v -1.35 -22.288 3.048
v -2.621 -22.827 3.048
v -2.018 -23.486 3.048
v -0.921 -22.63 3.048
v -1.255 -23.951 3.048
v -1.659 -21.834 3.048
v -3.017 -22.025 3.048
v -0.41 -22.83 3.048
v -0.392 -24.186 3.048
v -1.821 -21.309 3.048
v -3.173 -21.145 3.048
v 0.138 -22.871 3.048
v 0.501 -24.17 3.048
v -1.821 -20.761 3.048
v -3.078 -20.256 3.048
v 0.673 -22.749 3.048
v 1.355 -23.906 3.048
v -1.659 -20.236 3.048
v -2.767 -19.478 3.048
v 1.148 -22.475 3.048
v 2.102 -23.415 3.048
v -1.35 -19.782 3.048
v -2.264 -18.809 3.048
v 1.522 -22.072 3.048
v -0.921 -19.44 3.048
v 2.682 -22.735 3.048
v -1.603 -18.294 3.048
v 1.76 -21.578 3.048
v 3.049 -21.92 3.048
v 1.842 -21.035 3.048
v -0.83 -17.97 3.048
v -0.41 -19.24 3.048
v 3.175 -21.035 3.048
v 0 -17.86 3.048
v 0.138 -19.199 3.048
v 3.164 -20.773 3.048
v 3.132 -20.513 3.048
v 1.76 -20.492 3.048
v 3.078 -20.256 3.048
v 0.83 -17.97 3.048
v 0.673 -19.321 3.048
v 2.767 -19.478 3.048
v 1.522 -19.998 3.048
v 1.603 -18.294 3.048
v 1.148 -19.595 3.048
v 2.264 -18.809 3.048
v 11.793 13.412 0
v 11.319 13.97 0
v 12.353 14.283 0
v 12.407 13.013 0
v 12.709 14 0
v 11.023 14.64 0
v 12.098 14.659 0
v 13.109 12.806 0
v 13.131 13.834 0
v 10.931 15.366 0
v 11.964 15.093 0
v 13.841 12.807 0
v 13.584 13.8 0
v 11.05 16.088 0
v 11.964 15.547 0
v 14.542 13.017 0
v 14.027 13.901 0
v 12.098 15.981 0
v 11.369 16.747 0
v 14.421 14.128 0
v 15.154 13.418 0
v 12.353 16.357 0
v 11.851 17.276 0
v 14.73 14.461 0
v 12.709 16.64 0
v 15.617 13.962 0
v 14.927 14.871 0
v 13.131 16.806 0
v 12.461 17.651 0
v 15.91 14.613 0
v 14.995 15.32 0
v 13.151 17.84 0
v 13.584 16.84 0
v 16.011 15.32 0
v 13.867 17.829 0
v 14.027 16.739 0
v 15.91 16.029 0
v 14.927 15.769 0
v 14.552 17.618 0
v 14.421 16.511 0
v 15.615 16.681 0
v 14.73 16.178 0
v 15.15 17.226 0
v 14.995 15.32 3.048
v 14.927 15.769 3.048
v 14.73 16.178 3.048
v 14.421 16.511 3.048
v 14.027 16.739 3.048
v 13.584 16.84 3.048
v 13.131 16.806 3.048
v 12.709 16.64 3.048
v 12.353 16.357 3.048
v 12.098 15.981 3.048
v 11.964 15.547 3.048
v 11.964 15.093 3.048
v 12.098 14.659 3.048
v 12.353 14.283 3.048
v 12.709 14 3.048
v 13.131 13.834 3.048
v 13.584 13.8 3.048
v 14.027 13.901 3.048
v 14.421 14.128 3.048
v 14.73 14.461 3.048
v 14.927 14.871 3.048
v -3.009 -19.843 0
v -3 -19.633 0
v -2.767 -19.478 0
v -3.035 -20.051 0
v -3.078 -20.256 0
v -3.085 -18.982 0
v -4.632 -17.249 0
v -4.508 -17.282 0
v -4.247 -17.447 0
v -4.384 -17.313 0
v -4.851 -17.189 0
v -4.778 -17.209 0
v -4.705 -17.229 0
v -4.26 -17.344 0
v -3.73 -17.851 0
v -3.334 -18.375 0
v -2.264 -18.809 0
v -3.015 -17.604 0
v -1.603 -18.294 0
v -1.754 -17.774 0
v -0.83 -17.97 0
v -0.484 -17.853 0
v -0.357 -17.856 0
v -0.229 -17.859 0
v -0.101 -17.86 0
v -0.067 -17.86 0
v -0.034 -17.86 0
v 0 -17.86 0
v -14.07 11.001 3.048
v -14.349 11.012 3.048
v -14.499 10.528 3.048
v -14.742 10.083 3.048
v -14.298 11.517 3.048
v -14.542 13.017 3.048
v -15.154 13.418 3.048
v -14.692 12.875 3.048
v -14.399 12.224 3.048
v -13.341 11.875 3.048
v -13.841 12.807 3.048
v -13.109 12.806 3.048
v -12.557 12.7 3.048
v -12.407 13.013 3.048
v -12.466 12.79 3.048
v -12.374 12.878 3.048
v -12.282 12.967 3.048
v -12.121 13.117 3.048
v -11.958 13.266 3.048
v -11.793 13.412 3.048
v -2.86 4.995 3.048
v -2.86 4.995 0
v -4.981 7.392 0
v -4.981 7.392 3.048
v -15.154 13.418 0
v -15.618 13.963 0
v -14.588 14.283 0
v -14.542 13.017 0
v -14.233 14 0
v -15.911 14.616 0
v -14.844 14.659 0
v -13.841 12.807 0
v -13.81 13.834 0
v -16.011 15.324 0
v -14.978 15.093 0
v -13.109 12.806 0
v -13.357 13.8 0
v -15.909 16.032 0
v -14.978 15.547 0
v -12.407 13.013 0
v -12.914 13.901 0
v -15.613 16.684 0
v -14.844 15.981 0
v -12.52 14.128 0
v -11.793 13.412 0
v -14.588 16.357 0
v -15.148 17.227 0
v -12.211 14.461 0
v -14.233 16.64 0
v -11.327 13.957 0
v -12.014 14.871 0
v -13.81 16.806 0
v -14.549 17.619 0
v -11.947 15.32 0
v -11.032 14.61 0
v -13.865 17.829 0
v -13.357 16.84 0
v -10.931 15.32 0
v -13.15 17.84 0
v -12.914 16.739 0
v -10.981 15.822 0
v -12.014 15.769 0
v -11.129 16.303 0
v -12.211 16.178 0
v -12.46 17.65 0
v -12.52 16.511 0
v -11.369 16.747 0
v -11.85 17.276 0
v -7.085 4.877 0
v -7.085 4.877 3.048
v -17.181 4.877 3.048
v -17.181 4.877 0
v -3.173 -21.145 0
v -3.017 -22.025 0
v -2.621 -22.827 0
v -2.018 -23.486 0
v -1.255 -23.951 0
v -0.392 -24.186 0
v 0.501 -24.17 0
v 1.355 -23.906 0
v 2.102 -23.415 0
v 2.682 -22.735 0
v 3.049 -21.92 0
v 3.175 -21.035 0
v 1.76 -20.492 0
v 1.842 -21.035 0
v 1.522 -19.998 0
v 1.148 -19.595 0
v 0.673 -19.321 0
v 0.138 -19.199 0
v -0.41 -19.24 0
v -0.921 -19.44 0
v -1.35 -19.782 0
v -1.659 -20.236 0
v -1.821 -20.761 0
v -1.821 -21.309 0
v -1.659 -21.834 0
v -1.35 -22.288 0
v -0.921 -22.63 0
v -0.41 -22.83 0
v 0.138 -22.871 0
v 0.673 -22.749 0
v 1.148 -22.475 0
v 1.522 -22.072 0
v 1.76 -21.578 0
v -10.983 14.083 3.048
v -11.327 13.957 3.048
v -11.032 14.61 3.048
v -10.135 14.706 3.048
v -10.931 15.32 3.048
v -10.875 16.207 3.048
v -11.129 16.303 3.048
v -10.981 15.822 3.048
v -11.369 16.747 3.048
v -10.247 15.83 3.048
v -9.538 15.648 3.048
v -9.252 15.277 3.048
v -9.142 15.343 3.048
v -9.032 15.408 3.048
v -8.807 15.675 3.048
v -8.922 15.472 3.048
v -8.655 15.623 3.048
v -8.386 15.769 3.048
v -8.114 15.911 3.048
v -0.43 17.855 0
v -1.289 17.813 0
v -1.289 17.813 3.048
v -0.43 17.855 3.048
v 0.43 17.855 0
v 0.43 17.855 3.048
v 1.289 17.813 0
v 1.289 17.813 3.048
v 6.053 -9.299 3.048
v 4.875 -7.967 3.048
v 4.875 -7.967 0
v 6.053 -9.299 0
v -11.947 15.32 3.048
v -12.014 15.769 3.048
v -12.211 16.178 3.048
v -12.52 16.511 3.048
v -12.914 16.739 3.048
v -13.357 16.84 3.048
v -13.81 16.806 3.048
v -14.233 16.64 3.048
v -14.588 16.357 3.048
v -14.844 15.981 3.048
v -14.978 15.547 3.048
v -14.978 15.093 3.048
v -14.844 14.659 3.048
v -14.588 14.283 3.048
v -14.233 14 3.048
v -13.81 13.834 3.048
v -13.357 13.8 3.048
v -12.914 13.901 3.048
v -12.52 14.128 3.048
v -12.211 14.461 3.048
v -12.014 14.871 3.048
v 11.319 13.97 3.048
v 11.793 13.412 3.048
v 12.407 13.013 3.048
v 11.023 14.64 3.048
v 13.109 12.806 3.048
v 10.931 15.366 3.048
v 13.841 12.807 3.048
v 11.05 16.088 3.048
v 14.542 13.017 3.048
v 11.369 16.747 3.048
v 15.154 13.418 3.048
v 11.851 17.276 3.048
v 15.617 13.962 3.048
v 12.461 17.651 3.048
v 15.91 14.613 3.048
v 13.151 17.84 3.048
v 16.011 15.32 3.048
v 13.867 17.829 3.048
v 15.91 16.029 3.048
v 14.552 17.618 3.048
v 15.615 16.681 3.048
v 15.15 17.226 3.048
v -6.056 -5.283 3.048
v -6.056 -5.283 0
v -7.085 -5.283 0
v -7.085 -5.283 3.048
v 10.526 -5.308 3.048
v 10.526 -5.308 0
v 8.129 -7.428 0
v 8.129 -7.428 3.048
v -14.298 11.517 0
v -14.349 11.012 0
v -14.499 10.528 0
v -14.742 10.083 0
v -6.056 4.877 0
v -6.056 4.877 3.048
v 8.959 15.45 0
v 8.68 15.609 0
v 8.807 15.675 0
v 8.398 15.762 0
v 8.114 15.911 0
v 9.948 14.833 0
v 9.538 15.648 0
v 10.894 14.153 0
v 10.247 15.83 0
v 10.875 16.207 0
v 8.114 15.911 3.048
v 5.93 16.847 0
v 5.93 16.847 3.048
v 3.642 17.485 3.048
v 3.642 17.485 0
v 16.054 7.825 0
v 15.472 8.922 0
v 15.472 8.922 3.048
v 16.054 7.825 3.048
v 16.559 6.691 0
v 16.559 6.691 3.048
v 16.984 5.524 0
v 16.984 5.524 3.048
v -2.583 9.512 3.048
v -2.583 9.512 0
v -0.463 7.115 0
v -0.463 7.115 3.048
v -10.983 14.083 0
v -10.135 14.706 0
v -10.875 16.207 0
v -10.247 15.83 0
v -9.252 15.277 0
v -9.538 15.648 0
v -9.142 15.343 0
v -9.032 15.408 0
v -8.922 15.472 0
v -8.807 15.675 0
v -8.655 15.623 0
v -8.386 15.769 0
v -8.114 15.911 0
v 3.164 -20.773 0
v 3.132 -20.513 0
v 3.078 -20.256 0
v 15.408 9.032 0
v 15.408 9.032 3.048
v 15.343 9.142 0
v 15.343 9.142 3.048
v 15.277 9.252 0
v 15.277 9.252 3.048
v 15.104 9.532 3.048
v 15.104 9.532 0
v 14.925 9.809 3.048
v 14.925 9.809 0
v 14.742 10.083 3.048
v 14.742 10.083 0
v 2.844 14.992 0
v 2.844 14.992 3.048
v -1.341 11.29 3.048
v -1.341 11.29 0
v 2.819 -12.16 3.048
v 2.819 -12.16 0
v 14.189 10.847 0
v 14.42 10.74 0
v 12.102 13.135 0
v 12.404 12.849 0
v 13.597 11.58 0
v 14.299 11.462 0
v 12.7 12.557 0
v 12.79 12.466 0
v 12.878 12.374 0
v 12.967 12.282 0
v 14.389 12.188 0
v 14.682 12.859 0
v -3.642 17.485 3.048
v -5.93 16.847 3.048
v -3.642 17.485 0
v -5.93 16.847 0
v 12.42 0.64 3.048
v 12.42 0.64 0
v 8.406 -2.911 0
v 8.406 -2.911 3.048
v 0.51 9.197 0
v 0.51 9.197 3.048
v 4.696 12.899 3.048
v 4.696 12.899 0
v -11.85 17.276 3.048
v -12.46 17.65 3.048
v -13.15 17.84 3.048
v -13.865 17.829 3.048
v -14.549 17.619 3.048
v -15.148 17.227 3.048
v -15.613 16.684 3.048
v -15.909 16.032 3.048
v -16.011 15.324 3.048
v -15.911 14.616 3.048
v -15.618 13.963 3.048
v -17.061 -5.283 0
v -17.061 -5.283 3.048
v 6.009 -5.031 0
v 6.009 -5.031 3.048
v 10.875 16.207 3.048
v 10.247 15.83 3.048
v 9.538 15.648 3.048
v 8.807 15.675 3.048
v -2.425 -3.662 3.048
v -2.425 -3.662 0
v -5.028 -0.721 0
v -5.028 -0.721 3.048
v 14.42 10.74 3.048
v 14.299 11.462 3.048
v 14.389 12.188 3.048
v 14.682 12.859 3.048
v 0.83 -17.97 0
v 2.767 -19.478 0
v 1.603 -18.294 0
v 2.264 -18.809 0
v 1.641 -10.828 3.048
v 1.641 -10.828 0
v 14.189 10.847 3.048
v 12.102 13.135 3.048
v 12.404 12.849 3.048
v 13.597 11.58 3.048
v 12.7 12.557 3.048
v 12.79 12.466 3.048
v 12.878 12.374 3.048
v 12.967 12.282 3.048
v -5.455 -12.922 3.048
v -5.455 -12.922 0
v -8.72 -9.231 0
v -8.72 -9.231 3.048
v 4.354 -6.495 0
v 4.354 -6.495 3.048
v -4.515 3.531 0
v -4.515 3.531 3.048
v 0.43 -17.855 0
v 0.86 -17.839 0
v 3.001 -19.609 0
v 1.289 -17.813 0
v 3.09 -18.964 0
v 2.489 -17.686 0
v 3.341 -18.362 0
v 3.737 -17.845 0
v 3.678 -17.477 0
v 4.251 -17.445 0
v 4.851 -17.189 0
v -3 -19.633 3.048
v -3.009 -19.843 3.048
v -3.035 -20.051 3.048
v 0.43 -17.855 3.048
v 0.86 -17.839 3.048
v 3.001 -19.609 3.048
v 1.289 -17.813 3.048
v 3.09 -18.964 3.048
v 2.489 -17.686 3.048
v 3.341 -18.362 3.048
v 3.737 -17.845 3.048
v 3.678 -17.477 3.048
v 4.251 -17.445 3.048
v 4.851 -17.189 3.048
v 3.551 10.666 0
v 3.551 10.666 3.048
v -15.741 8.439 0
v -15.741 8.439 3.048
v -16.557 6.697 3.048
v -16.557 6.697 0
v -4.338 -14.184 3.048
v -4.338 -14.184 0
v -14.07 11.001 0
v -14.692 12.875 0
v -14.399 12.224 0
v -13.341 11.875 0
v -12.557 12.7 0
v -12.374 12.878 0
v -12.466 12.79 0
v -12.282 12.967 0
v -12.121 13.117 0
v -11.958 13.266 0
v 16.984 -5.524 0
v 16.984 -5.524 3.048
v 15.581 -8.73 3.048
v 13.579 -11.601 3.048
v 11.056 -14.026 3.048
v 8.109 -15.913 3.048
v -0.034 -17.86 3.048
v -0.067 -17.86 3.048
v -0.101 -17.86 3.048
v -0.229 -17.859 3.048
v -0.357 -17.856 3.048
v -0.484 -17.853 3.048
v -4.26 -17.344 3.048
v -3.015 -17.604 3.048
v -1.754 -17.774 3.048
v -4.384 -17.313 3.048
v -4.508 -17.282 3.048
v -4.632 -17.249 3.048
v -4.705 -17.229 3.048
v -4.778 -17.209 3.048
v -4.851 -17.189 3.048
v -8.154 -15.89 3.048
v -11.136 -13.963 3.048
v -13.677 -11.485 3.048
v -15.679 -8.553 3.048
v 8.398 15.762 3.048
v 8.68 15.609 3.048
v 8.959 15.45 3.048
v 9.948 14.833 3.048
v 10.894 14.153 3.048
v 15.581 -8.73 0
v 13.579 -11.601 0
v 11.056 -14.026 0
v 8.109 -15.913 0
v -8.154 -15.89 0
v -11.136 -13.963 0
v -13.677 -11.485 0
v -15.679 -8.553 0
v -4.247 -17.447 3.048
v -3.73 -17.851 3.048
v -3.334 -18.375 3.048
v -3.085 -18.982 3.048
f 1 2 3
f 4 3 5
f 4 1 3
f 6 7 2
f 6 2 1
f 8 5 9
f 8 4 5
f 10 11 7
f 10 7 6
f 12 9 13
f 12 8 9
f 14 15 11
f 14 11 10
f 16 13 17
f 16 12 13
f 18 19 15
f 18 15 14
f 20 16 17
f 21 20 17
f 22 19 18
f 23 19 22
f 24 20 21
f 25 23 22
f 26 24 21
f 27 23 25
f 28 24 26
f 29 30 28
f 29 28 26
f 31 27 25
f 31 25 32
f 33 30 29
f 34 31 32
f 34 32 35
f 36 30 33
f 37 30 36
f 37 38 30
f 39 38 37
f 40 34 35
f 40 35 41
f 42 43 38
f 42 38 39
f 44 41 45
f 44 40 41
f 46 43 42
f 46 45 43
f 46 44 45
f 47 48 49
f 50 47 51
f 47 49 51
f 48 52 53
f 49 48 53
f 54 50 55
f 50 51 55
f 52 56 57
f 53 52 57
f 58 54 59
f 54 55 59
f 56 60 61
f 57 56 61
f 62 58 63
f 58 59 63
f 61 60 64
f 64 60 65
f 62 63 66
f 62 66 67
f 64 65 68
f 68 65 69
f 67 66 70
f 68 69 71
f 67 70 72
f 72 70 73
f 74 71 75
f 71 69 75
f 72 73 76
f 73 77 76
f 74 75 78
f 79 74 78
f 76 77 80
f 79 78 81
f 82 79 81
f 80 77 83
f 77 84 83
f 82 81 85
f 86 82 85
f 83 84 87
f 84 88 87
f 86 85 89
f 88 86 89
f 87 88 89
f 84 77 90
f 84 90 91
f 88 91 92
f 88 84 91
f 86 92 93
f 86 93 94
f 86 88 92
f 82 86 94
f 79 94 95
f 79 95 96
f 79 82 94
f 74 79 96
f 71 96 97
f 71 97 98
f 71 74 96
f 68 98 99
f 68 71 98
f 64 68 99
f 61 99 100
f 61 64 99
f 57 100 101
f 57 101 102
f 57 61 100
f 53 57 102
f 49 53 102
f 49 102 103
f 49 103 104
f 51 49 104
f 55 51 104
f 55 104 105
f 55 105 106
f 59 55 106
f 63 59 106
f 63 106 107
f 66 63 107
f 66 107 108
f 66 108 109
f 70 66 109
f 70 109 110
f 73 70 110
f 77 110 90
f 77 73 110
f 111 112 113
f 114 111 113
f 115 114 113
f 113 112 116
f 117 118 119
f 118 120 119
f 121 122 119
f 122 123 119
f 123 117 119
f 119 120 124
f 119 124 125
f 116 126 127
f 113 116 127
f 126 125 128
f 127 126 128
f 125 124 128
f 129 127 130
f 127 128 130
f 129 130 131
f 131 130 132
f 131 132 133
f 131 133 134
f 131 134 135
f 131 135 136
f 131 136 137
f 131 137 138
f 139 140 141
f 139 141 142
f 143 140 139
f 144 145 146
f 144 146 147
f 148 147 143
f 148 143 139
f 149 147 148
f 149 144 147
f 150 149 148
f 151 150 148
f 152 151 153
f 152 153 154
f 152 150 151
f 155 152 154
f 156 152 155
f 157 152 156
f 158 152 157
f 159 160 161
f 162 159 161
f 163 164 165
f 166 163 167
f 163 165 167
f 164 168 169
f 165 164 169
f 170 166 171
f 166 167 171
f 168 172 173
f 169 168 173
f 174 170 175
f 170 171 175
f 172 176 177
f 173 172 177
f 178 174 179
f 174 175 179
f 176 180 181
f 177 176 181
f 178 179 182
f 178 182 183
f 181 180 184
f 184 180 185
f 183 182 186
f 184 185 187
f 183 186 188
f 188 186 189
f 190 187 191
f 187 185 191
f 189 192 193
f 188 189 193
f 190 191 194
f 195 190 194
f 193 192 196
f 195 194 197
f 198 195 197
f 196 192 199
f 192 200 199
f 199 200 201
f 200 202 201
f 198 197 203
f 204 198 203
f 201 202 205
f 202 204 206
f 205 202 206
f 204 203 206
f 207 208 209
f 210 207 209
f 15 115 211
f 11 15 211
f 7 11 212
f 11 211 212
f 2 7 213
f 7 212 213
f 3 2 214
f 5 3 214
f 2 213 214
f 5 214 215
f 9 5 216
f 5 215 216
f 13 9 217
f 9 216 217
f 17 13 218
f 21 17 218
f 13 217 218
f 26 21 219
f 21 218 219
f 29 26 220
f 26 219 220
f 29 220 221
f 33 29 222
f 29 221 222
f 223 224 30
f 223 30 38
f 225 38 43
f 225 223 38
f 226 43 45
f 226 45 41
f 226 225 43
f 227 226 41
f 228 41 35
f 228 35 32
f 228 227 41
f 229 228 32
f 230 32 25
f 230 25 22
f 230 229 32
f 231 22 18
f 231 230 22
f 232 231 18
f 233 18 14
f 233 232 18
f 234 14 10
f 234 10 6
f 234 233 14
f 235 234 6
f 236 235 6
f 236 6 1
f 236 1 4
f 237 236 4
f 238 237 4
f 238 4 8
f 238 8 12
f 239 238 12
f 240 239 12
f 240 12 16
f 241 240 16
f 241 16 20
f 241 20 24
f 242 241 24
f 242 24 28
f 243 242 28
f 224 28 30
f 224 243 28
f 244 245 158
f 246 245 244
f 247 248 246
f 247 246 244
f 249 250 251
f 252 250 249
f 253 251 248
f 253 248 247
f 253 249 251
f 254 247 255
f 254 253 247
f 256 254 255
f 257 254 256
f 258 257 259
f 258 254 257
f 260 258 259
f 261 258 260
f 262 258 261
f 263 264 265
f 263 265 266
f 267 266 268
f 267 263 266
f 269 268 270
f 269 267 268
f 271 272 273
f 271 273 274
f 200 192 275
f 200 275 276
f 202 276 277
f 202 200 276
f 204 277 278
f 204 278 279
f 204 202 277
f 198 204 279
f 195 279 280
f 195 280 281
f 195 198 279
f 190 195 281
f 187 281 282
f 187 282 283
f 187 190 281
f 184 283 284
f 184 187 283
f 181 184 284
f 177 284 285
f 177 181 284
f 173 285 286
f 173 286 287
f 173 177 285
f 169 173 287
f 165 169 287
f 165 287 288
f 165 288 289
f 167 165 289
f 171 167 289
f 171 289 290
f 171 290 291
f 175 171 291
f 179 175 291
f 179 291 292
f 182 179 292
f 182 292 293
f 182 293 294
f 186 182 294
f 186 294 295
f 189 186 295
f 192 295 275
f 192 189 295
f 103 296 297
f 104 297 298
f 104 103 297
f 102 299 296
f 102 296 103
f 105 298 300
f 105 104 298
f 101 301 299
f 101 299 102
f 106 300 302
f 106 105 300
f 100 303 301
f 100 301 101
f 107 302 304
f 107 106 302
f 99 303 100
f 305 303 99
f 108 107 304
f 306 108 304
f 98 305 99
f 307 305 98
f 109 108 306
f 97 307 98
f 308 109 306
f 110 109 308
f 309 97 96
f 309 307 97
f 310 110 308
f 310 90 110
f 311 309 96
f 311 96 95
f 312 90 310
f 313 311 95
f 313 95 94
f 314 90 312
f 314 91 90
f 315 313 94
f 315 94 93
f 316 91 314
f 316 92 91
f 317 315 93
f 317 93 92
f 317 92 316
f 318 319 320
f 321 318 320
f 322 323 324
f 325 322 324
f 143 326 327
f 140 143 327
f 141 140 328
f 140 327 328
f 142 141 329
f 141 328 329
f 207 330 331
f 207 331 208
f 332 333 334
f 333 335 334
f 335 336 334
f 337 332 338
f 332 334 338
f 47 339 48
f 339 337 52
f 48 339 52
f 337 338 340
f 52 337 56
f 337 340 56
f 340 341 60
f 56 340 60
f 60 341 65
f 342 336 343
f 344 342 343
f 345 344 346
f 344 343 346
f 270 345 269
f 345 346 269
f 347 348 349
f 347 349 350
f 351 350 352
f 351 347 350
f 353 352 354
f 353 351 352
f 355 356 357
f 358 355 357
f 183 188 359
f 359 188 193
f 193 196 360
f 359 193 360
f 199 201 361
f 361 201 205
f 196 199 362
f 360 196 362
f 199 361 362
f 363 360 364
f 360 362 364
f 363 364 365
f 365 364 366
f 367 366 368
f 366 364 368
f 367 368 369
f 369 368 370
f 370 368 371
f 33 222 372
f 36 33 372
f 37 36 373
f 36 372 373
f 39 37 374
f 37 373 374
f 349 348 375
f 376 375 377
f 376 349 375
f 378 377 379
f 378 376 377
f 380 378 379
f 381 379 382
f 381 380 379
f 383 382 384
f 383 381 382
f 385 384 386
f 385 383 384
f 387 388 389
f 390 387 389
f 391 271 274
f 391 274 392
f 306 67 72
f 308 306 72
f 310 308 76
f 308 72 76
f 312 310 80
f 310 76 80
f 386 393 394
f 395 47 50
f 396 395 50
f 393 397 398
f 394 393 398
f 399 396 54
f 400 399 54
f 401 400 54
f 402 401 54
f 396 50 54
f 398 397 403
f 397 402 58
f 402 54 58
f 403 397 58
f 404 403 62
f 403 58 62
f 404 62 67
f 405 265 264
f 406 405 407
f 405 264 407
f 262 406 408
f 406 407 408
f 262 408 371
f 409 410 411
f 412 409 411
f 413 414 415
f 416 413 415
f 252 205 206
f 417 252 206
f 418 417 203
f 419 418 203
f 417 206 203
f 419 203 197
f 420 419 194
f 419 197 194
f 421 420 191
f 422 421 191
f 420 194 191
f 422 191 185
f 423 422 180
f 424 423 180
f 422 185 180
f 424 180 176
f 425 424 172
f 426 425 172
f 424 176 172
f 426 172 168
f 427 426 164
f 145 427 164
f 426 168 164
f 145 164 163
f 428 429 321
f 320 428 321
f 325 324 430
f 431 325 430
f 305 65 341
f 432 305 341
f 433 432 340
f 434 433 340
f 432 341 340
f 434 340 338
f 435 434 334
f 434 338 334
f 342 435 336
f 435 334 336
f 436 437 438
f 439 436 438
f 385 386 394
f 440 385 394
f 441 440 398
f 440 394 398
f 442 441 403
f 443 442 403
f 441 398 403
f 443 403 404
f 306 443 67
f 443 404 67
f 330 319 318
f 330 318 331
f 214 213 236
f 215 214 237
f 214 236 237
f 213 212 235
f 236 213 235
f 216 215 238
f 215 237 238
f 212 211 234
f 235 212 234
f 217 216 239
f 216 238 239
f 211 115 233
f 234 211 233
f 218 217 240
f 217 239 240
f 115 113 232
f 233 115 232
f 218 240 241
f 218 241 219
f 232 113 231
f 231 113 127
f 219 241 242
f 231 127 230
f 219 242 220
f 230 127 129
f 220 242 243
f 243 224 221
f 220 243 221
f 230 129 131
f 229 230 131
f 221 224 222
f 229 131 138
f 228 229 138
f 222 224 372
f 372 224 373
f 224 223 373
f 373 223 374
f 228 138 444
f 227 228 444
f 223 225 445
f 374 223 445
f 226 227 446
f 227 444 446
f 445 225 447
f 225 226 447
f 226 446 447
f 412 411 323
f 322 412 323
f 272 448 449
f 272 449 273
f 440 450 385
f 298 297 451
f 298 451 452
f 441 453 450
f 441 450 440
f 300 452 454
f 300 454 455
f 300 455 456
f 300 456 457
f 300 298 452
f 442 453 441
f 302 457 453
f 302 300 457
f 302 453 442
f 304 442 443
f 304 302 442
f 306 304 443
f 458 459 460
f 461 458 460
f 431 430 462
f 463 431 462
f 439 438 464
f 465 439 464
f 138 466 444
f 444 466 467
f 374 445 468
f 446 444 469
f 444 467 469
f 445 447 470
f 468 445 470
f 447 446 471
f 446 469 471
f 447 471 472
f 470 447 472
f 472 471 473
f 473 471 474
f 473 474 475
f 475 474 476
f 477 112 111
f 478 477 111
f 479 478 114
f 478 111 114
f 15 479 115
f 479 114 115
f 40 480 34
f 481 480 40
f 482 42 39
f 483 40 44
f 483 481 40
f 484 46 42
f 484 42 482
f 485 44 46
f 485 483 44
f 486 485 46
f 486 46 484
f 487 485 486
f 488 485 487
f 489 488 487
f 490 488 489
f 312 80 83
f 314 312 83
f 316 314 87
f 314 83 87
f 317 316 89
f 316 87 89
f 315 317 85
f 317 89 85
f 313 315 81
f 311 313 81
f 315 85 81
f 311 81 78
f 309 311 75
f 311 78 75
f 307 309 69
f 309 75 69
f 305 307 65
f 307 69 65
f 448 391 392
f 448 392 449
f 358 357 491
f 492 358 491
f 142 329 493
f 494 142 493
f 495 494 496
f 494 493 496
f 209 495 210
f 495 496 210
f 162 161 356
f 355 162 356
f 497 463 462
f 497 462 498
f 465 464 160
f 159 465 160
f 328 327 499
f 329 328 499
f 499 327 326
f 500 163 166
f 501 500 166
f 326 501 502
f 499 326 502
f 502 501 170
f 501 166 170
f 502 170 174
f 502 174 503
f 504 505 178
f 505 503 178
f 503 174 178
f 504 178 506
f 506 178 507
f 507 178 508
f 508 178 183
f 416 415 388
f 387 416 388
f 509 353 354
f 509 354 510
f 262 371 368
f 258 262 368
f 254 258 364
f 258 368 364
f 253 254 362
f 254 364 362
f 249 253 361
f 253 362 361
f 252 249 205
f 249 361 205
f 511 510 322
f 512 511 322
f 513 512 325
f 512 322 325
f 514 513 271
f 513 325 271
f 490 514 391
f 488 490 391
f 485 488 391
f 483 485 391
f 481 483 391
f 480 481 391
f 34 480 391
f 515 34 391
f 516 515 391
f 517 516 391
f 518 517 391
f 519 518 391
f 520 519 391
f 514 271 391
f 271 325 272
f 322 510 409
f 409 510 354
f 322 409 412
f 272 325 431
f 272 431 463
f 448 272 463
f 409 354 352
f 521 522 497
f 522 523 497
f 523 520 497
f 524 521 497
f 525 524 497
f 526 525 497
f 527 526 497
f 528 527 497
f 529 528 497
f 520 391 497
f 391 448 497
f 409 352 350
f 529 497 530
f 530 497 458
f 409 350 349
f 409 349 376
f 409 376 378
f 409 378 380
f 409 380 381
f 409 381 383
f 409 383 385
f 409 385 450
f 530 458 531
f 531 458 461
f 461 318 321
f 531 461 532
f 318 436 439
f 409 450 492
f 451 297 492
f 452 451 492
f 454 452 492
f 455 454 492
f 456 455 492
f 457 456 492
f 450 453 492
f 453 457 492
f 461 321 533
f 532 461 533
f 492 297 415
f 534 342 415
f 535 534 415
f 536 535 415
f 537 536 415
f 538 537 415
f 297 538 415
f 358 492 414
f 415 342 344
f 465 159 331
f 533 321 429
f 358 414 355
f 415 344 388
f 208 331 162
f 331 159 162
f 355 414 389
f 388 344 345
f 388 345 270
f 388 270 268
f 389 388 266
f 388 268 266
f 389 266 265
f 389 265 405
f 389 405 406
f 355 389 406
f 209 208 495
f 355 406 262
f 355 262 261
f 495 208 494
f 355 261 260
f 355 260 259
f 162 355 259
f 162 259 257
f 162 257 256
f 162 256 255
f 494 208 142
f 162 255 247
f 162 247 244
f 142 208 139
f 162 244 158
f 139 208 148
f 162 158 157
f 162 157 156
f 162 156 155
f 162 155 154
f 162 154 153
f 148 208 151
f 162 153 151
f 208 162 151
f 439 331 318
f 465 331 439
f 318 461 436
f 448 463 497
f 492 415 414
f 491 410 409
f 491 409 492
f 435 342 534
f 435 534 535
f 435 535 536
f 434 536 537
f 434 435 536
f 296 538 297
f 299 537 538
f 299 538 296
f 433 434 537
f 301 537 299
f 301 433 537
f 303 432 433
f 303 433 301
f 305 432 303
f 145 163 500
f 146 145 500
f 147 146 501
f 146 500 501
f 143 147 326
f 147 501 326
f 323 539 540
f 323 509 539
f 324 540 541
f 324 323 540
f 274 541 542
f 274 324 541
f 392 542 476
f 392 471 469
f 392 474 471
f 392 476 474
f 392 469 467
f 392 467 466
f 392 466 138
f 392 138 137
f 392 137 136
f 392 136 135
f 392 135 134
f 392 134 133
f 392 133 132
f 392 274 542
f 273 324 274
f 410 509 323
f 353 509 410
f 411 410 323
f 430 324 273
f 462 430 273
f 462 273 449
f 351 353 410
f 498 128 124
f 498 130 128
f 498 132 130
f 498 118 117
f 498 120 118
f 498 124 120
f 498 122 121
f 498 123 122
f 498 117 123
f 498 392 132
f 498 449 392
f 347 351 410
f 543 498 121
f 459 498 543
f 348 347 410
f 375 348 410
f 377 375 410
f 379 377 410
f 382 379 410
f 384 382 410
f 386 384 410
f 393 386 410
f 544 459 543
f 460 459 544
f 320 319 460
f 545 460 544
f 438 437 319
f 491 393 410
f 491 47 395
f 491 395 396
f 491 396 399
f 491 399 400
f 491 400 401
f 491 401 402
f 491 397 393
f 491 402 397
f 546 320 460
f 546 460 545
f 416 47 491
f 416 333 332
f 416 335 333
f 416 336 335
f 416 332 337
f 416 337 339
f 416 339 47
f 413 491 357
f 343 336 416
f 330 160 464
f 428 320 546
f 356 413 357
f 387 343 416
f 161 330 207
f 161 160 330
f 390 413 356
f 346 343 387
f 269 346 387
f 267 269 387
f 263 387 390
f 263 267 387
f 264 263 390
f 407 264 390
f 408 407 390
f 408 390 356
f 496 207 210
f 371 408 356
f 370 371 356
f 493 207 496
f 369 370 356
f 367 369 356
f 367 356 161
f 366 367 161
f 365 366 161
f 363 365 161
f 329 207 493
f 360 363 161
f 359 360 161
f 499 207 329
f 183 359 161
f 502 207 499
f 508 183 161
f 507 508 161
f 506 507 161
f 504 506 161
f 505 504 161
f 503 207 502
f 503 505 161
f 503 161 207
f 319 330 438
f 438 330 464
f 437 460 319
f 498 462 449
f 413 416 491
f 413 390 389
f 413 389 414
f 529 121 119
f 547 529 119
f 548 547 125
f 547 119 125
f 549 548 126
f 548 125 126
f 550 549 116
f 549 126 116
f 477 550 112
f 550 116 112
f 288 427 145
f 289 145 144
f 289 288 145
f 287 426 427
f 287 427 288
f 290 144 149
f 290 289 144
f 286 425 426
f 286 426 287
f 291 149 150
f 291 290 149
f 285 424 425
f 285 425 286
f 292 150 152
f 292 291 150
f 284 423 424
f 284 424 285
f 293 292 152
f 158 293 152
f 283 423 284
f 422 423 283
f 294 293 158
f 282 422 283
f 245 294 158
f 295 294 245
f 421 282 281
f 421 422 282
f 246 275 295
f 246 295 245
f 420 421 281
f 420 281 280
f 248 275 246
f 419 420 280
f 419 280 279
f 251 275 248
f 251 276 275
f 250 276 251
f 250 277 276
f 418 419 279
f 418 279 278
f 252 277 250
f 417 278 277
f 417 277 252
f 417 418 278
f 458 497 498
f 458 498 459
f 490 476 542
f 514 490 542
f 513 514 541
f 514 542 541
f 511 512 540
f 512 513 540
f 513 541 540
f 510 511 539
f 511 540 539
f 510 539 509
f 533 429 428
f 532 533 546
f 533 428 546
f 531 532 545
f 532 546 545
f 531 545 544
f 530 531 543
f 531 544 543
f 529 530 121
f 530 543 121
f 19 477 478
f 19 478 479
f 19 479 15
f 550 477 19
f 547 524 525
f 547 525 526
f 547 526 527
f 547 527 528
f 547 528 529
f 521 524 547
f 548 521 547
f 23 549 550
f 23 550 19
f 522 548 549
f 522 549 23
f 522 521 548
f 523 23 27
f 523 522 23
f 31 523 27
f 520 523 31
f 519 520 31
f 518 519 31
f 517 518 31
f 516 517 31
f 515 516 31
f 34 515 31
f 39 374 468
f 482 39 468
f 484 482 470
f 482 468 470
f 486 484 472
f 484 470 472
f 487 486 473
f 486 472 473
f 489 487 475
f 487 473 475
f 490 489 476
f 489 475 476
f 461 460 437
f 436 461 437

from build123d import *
from build123d.topology import SkipClean

# Parameters (mm, degrees)
SKETCH1_R           = 1.4224
BOSS_EXTRUDE1_DEPTH = 3.048
CUT_EXTRUDE3_DEPTH  = 31.684629768
CUT_EXTRUDE4_DEPTH  = 31.684629768
SKETCH4_R           = 1.1049
BOSS_EXTRUDE2_DEPTH = 3.048
SKETCH4_3_R         = 1.1049
CUT_EXTRUDE5_DEPTH  = 31.619000053
CUT_EXTRUDE10_DEPTH = 29.661642774
BOSS_EXTRUDE3_START = -3.048
BOSS_EXTRUDE3_DEPTH = 3.048
SKETCH7_W           = 1.0287
SKETCH7_H           = 10.16
CUT_EXTRUDE11_DEPTH = 30.194889838
SKETCH8_R           = 23.497624495
SKETCH8_R_2         = 17.859965052
CUT_EXTRUDE12_DEPTH = 30.194889838
BOSS_EXTRUDE4_START = -3.048
SKETCH9_R           = 2.54
SKETCH9_R_2         = 1.524
SKETCH9_R_3         = 3.175
SKETCH9_R_4         = 1.8415
BOSS_EXTRUDE4_DEPTH = 3.048
CUT_EXTRUDE14_DEPTH = 30.843054222


with BuildPart() as part:
    # Sketch1 → Boss-Extrude1 (new body)
    with BuildSketch(Plane.XY):
        with BuildLine():
            Line((-5.027565338, -0.720652536), (-4.515281158, 3.5306))
            Line((-4.515281158, 3.5306), (-2.860140414, 4.994714494))
            Line((-2.860140414, 4.994714494), (-4.980602482, 7.391837931))
            Line((-4.980602482, 7.391837931), (-2.583479045, 9.5123))
            Line((-2.583479045, 9.5123), (-0.463016976, 7.115176563))
            Line((-0.463016976, 7.115176563), (11.876076152, 18.030166811))
            ThreePointArc((11.876076152, 18.030166811), (-16.886200405, -13.453041882), (20.228041911, 7.546815251))
            Line((20.228041911, 7.546815251), (8.405899773, -2.910887338))
            Line((8.405899773, -2.910887338), (10.526361842, -5.308010776))
            Line((10.526361842, -5.308010776), (8.129238404, -7.428472845))
            Line((8.129238404, -7.428472845), (6.008776335, -5.031349407))
            Line((6.008776335, -5.031349407), (4.353635591, -6.495463901))
            Line((4.353635591, -6.495463901), (1.815981702, -6.489359631))
            Line((1.815981702, -6.489359631), (-5.455454601, -12.9215711))
            Line((-5.455454601, -12.9215711), (-8.720293025, -9.230761998))
            Line((-8.720293025, -9.230761998), (-2.425370717, -3.662361234))
            Line((-2.425370717, -3.662361234), (-5.027565338, -0.720652536))
        make_face()
        with Locations(Location((0, 18.415, 0), (0, 0, 180))):
            Circle(SKETCH1_R, mode=Mode.SUBTRACT)
        with Locations(Location((0, -18.415, 0), (0, 0, 180))):
            Circle(SKETCH1_R, mode=Mode.SUBTRACT)
    extrude(amount=BOSS_EXTRUDE1_DEPTH)

    # Sketch2 → Cut-Extrude3 (cut, through all)
    with BuildSketch(Plane.XY.offset(3.048)):
        with BuildLine():
            Line((-7.084965338, 4.8768), (-21.031997569, 4.8768))
            ThreePointArc((-21.031997569, 4.8768), (-21.588987692, -0.209070373), (-20.933606898, -5.2832))
            Line((-20.933606898, -5.2832), (-7.084965338, -5.2832))
            Line((-7.084965338, -5.2832), (-7.084965338, 4.8768))
        make_face()
    extrude(amount=-CUT_EXTRUDE3_DEPTH, mode=Mode.SUBTRACT)

    # Sketch3 → Cut-Extrude4 (cut, through all)
    with BuildSketch(Plane(origin=(0, 0, 0), x_dir=(-1, 0, 0), z_dir=(0, 0, -1))):
        with BuildLine():
            Line((-20.871224203, -5.5245), (-16.984058744, -5.5245))
            Line((-16.984058744, -5.5245), (-16.984058744, 4.677232838))
            Line((-16.984058744, 4.677232838), (-20.228041911, 7.546815251))
            ThreePointArc((-20.228041911, 7.546815251), (-21.563910577, 1.061065789), (-20.871224203, -5.5245))
        make_face()
    extrude(amount=-CUT_EXTRUDE4_DEPTH, mode=Mode.SUBTRACT)

    # Sketch4 → Boss-Extrude2 (add)
    # profile 1 of 5: a face of its own
    with BuildSketch(Plane(origin=(0, 0, 0), x_dir=(-1, 0, 0), z_dir=(0, 0, -1))):
        with BuildLine():
            Line((-16.984058744, 5.5245), (-16.984058744, 4.677232838))
            Line((-16.984058744, 4.677232838), (-12.420130291, 0.640045174))
            Line((-12.420130291, 0.640045174), (-3.551213542, 10.666109075))
            Line((-3.551213542, 10.666109075), (-8.959431605, 15.450143591))
            ThreePointArc((-8.959431605, 15.450143591), (-11.076965007, 14.009967805), (-12.966760902, 12.28175327))
            Line((-12.966760902, 12.28175327), (-15.004080987, 13.83506338))
            ThreePointArc((-15.004080987, 13.83506338), (-17.674010029, 13.475162132), (-17.314108781, 10.80523309))
            Line((-17.314108781, 10.80523309), (-15.276788696, 9.25192298))
            ThreePointArc((-15.276788696, 9.25192298), (-16.237733521, 7.437362555), (-16.984058744, 5.5245))
        make_face()
        with Locations((-16.159094884, 12.320148235)):
            Circle(SKETCH4_R, mode=Mode.SUBTRACT)
    # profile 2 of 5: a face of its own
    with BuildSketch(Plane(origin=(0, 0, 0), x_dir=(-1, 0, 0), z_dir=(0, 0, -1))):
        with BuildLine():
            ThreePointArc((-1.288911844, -17.813395463), (-0.402766027, -17.855423019), (0.484373541, -17.853395586))
            Line((0.484373541, -17.853395586), (0.725034865, -19.638742704))
            ThreePointArc((0.725034865, -19.638742704), (0.955229003, -17.361074333), (-1.288911844, -17.813395463))
        make_face()
    # profile 3 of 5: a face of its own
    with BuildSketch(Plane(origin=(0, 0, 0), x_dir=(-1, 0, 0), z_dir=(0, 0, -1))):
        with BuildLine():
            ThreePointArc((4.327227494, -21.151907768), (2.884204284, -21.396482553), (1.427926458, -21.542727915))
            ThreePointArc((1.427926458, -21.542727915), (2.969033821, -22.025790864), (4.327227494, -21.151907768))
        make_face()
    # profile 4 of 5: a face of its own
    with BuildSketch(Plane(origin=(0, 0, 0), x_dir=(-1, 0, 0), z_dir=(0, 0, -1))):
        with BuildLine():
            ThreePointArc((1.288911844, 17.813395463), (0, 17.859965052), (-1.288911844, 17.813395463))
            ThreePointArc((-1.288911844, 17.813395463), (0, 16.9926), (1.288911844, 17.813395463))
        make_face()
    # profile 5 of 5: a face of its own
    with BuildSketch(Plane(origin=(0, 0, 0), x_dir=(-1, 0, 0), z_dir=(0, 0, -1))):
        with BuildLine():
            ThreePointArc((14.223312513, 16.242705475), (13.475162132, 17.674010029), (11.896845513, 18.016469323))
            ThreePointArc((11.896845513, 18.016469323), (13.0901575, 17.169038314), (14.223312513, 16.242705475))
        make_face()
    extrude(amount=-BOSS_EXTRUDE2_DEPTH)

    # Sketch4<3> → Cut-Extrude5 (cut, through all)
    with SkipClean():  # the faces are left unmerged after this step: merging them gives an invalid solid
        with BuildSketch(Plane(origin=(0, 0, 0), x_dir=(-1, 0, 0), z_dir=(0, 0, -1))):
            with BuildLine():
                ThreePointArc((-20.871224203, -5.5245), (-12.595886757, -17.534872021), (1.427926458, -21.542727915))
                ThreePointArc((1.427926458, -21.542727915), (1.026270462, -21.020335978), (0.826620277, -20.392354546))
                Line((0.826620277, -20.392354546), (0.725034865, -19.638742704))
                ThreePointArc((0.725034865, -19.638742704), (-0.955229003, -19.468925667), (-1.288911844, -17.813395463))
                ThreePointArc((-1.288911844, -17.813395463), (-11.010431484, -14.062316673), (-16.984058744, -5.5245))
                Line((-16.984058744, -5.5245), (-20.871224203, -5.5245))
            make_face()
            with BuildLine():
                ThreePointArc((4.602470139, -19.883377319), (4.576225926, -20.541808877), (4.327227494, -21.151907768))
                ThreePointArc((4.327227494, -21.151907768), (14.915810742, -15.609186074), (20.933606898, -5.2832))
                Line((20.933606898, -5.2832), (17.060660873, -5.2832))
                ThreePointArc((17.060660873, -5.2832), (12.247990597, -12.998656777), (4.260223404, -17.344418359))
                Line((4.260223404, -17.344418359), (4.602470139, -19.883377319))
            make_face()
            with BuildLine():
                Line((-11.876076152, 18.030166811), (-8.959431605, 15.450143591))
                ThreePointArc((-8.959431605, 15.450143591), (-5.258647708, 17.068244665), (-1.288911844, 17.813395463))
                ThreePointArc((-1.288911844, 17.813395463), (0, 19.8374), (1.288911844, 17.813395463))
                ThreePointArc((1.288911844, 17.813395463), (5.420875683, 17.017416329), (9.25192298, 15.276788696))
                Line((9.25192298, 15.276788696), (10.80523309, 17.314108781))
                ThreePointArc((10.80523309, 17.314108781), (11.28937197, 17.76113274), (11.896845513, 18.016469323))
                ThreePointArc((11.896845513, 18.016469323), (0.01243973, 21.589996416), (-11.876076152, 18.030166811))
            make_face()
            with BuildLine():
                Line((13.83506338, 15.004080987), (12.28175327, 12.966760902))
                ThreePointArc((12.28175327, 12.966760902), (15.276744775, 9.251995502), (17.181244816, 4.8768))
                Line((17.181244816, 4.8768), (21.031997569, 4.8768))
                ThreePointArc((21.031997569, 4.8768), (18.521073783, 11.09495047), (14.223312513, 16.242705475))
                ThreePointArc((14.223312513, 16.242705475), (14.13793931, 15.589304916), (13.83506338, 15.004080987))
            make_face()
            with Locations((12.320148235, 16.159094884)):
                Circle(SKETCH4_3_R)
            with Locations((2.714545208, -20.137865932)):
                Circle(SKETCH4_3_R)
        extrude(amount=-CUT_EXTRUDE5_DEPTH, mode=Mode.SUBTRACT)

    # Sketch5 → Cut-Extrude10 (cut, through all)
    with SkipClean():  # the faces are left unmerged after this step: merging them gives an invalid solid
        with BuildSketch(Plane.XY.offset(3.048)):
            Polygon((4.353635591, -6.495463901), (-4.338426069, -14.184340812), (-5.455454601, -12.9215711), (1.815981702, -6.489359631), align=None)
        extrude(amount=-CUT_EXTRUDE10_DEPTH, mode=Mode.SUBTRACT)

    # Sketch6 → Boss-Extrude3 (add)
    with SkipClean():  # the faces are left unmerged after this step: merging them gives an invalid solid
        with BuildSketch(Plane.XY.offset(3.048).offset(BOSS_EXTRUDE3_START)):
            with BuildLine():
                ThreePointArc((-9.25192298, 15.276788696), (-9.087308864, 15.375277861), (-8.92164642, 15.471993305))
                Line((-8.92164642, 15.471993305), (-8.948939951, 15.507791475))
                Line((-8.948939951, 15.507791475), (-10.502250061, 17.54511156))
                ThreePointArc((-10.502250061, 17.54511156), (-13.706164911, 17.976993058), (-14.138046409, 14.773078207))
                Line((-14.138046409, 14.773078207), (-12.584736299, 12.735758122))
                Line((-12.584736299, 12.735758122), (-12.557442768, 12.699959952))
                ThreePointArc((-12.557442768, 12.699959952), (-12.420314434, 12.83410071), (-12.28175327, 12.966760902))
                Line((-12.28175327, 12.966760902), (-13.83506338, 15.004080987))
                ThreePointArc((-13.83506338, 15.004080987), (-13.475162132, 17.674010029), (-10.80523309, 17.314108781))
                Line((-10.80523309, 17.314108781), (-9.25192298, 15.276788696))
            make_face()
            with BuildLine():
                Line((-0.106788555, -17.904293309), (-0.100774867, -17.859680739))
                ThreePointArc((-0.100774867, -17.859680739), (-0.292591081, -17.857568203), (-0.484373541, -17.853395586))
                Line((-0.484373541, -17.853395586), (-0.826620277, -20.392354546))
                ThreePointArc((-0.826620277, -20.392354546), (-2.969033821, -22.025790864), (-4.602470139, -19.883377319))
                Line((-4.602470139, -19.883377319), (-4.260223404, -17.344418359))
                ThreePointArc((-4.260223404, -17.344418359), (-4.446265517, -17.297660958), (-4.631794702, -17.248908067))
                Line((-4.631794702, -17.248908067), (-4.63780839, -17.293520637))
                Line((-4.63780839, -17.293520637), (-4.980055125, -19.832479597))
                ThreePointArc((-4.980055125, -19.832479597), (-3.019931544, -22.40337585), (-0.449035291, -20.443252268))
                Line((-0.449035291, -20.443252268), (-0.106788555, -17.904293309))
            make_face()
            with BuildLine():
                ThreePointArc((15.004080987, 13.83506338), (17.674010029, 13.475162132), (17.314108781, 10.80523309))
                Line((17.314108781, 10.80523309), (15.276788696, 9.25192298))
                ThreePointArc((15.276788696, 9.25192298), (15.375277861, 9.087308864), (15.471993305, 8.92164642))
                Line((15.471993305, 8.92164642), (17.54511156, 10.502250061))
                ThreePointArc((17.54511156, 10.502250061), (17.976993058, 13.706164911), (14.773078207, 14.138046409))
                Line((14.773078207, 14.138046409), (12.699959952, 12.557442768))
                ThreePointArc((12.699959952, 12.557442768), (12.83410071, 12.420314434), (12.966760902, 12.28175327))
                Line((12.966760902, 12.28175327), (15.004080987, 13.83506338))
            make_face()
        extrude(amount=BOSS_EXTRUDE3_DEPTH)

    # Sketch7 → Cut-Extrude11 (cut, through all)
    with SkipClean():  # the faces are left unmerged after this step: merging them gives an invalid solid
        with BuildSketch(Plane(origin=(0, 0, 0), x_dir=(-1, 0, 0), z_dir=(0, 0, -1))):
            with Locations((6.570615338, -0.2032)):
                Rectangle(SKETCH7_W, SKETCH7_H)
        extrude(amount=-CUT_EXTRUDE11_DEPTH, mode=Mode.SUBTRACT)

    # Sketch8 → Cut-Extrude12 (cut, through all)
    with SkipClean():  # the faces are left unmerged after this step: merging them gives an invalid solid
        with BuildSketch(Plane.XY.offset(3.048)):
            Circle(SKETCH8_R)
            Circle(SKETCH8_R_2, mode=Mode.SUBTRACT)
        extrude(amount=-CUT_EXTRUDE12_DEPTH, mode=Mode.SUBTRACT)

    # Sketch9 → Boss-Extrude4 (add)
    # profile 1 of 9: a face of its own
    with SkipClean():  # the faces are left unmerged after this step: merging them gives an invalid solid
        with BuildSketch(Plane.XY.offset(3.048).offset(BOSS_EXTRUDE4_START)):
            with BuildLine():
                ThreePointArc((14.741706397, 10.082680407), (14.317457477, 11.828509859), (15.154420991, 13.418289622))
                ThreePointArc((15.154420991, 13.418289622), (13.475000191, 12.779968852), (11.793381211, 13.412475957))
                ThreePointArc((11.793381211, 13.412475957), (13.371596882, 11.839710659), (14.741706397, 10.082680407))
            make_face()
        # profile 2 of 9: a face of its own
        with BuildSketch(Plane.XY.offset(3.048).offset(BOSS_EXTRUDE4_START)):
            with Locations((13.470606702, 15.319965052)):
                Circle(SKETCH9_R)
            with Locations((13.470606702, 15.319965052)):
                Circle(SKETCH9_R_2, mode=Mode.SUBTRACT)
        # profile 3 of 9: a face of its own
        with BuildSketch(Plane.XY.offset(3.048).offset(BOSS_EXTRUDE4_START)):
            with BuildLine():
                ThreePointArc((11.793381211, 13.412475957), (10.950922895, 14.999350783), (11.369129659, 16.746637488))
                ThreePointArc((11.369129659, 16.746637488), (9.899497892, 15.713153035), (8.113737041, 15.910550679))
                ThreePointArc((8.113737041, 15.910550679), (10.031621684, 14.776498844), (11.793381211, 13.412475957))
            make_face()
        # profile 4 of 9: a face of its own
        with BuildSketch(Plane.XY.offset(3.048).offset(BOSS_EXTRUDE4_START)):
            with BuildLine():
                ThreePointArc((-14.741706395, 10.08268041), (-13.371596897, 11.839710643), (-11.793381246, 13.412475926))
                ThreePointArc((-11.793381246, 13.412475926), (-13.475000239, 12.779968852), (-15.154421029, 13.418289656))
                ThreePointArc((-15.154421029, 13.418289656), (-14.522151553, 12.559377803), (-14.29823536, 11.516614264))
                ThreePointArc((-14.29823536, 11.516614264), (-14.411634489, 10.766142269), (-14.741706395, 10.08268041))
            make_face()
        # profile 5 of 9: a face of its own
        with BuildSketch(Plane.XY.offset(3.048).offset(BOSS_EXTRUDE4_START)):
            with Locations((-13.470606702, 15.319965052)):
                Circle(SKETCH9_R)
            with Locations((-13.470606702, 15.319965052)):
                Circle(SKETCH9_R_2, mode=Mode.SUBTRACT)
        # profile 6 of 9: a face of its own
        with BuildSketch(Plane.XY.offset(3.048).offset(BOSS_EXTRUDE4_START)):
            with BuildLine():
                ThreePointArc((-11.793381246, 13.412475926), (-10.031621687, 14.776498841), (-8.113737006, 15.910550697))
                ThreePointArc((-8.113737006, 15.910550697), (-9.899497839, 15.713153021), (-11.36912962, 16.74663743))
                ThreePointArc((-11.36912962, 16.74663743), (-11.042711339, 16.066238532), (-10.930606702, 15.319965052))
                ThreePointArc((-10.930606702, 15.319965052), (-11.15633007, 14.27319685), (-11.793381246, 13.412475926))
            make_face()
        # profile 7 of 9: a face of its own
        with BuildSketch(Plane.XY.offset(3.048).offset(BOSS_EXTRUDE4_START)):
            with Locations((0, -21.034965052)):
                Circle(SKETCH9_R_3)
            with Locations((0, -21.034965052)):
                Circle(SKETCH9_R_4, mode=Mode.SUBTRACT)
        # profile 8 of 9: a face of its own
        with BuildSketch(Plane.XY.offset(3.048).offset(BOSS_EXTRUDE4_START)):
            with BuildLine():
                ThreePointArc((-3.07801145, -20.256202884), (-1.95039164, -18.52965121), (5e-09, -17.859965052))
                ThreePointArc((5e-09, -17.859965052), (-2.448407595, -17.691343983), (-4.850582953, -17.188664773))
                ThreePointArc((-4.850582953, -17.188664773), (-3.515107511, -18.100319075), (-3.000420852, -19.633194109))
                ThreePointArc((-3.000420852, -19.633194109), (-3.019893142, -19.947105018), (-3.07801145, -20.256202884))
            make_face()
        # profile 9 of 9: a face of its own
        with BuildSketch(Plane.XY.offset(3.048).offset(BOSS_EXTRUDE4_START)):
            with BuildLine():
                ThreePointArc((3.078011454, -20.2562029), (3.341190684, -18.362372853), (4.850582919, -17.188664783))
                ThreePointArc((4.850582919, -17.188664783), (2.448407582, -17.691343985), (5e-09, -17.859965052))
                ThreePointArc((5e-09, -17.859965052), (1.95039165, -18.529651218), (3.078011454, -20.2562029))
            make_face()
        extrude(amount=BOSS_EXTRUDE4_DEPTH)

    # Sketch11 → Cut-Extrude14 (cut, through all)
    with SkipClean():  # the faces are left unmerged after this step: merging them gives an invalid solid
        with BuildSketch(Plane.XY.offset(3.048)):
            Polygon((-1.341002823, 11.289608099), (0.510194221, 9.196881289), (4.695647842, 12.899275377), (2.844450797, 14.992002188), align=None)
            Polygon((6.053340658, -9.298694678), (2.819126496, -12.159635565), (1.641092014, -10.827900322), (4.875306175, -7.966959435), align=None)
        extrude(amount=-CUT_EXTRUDE14_DEPTH, mode=Mode.SUBTRACT)


solid = part.part
